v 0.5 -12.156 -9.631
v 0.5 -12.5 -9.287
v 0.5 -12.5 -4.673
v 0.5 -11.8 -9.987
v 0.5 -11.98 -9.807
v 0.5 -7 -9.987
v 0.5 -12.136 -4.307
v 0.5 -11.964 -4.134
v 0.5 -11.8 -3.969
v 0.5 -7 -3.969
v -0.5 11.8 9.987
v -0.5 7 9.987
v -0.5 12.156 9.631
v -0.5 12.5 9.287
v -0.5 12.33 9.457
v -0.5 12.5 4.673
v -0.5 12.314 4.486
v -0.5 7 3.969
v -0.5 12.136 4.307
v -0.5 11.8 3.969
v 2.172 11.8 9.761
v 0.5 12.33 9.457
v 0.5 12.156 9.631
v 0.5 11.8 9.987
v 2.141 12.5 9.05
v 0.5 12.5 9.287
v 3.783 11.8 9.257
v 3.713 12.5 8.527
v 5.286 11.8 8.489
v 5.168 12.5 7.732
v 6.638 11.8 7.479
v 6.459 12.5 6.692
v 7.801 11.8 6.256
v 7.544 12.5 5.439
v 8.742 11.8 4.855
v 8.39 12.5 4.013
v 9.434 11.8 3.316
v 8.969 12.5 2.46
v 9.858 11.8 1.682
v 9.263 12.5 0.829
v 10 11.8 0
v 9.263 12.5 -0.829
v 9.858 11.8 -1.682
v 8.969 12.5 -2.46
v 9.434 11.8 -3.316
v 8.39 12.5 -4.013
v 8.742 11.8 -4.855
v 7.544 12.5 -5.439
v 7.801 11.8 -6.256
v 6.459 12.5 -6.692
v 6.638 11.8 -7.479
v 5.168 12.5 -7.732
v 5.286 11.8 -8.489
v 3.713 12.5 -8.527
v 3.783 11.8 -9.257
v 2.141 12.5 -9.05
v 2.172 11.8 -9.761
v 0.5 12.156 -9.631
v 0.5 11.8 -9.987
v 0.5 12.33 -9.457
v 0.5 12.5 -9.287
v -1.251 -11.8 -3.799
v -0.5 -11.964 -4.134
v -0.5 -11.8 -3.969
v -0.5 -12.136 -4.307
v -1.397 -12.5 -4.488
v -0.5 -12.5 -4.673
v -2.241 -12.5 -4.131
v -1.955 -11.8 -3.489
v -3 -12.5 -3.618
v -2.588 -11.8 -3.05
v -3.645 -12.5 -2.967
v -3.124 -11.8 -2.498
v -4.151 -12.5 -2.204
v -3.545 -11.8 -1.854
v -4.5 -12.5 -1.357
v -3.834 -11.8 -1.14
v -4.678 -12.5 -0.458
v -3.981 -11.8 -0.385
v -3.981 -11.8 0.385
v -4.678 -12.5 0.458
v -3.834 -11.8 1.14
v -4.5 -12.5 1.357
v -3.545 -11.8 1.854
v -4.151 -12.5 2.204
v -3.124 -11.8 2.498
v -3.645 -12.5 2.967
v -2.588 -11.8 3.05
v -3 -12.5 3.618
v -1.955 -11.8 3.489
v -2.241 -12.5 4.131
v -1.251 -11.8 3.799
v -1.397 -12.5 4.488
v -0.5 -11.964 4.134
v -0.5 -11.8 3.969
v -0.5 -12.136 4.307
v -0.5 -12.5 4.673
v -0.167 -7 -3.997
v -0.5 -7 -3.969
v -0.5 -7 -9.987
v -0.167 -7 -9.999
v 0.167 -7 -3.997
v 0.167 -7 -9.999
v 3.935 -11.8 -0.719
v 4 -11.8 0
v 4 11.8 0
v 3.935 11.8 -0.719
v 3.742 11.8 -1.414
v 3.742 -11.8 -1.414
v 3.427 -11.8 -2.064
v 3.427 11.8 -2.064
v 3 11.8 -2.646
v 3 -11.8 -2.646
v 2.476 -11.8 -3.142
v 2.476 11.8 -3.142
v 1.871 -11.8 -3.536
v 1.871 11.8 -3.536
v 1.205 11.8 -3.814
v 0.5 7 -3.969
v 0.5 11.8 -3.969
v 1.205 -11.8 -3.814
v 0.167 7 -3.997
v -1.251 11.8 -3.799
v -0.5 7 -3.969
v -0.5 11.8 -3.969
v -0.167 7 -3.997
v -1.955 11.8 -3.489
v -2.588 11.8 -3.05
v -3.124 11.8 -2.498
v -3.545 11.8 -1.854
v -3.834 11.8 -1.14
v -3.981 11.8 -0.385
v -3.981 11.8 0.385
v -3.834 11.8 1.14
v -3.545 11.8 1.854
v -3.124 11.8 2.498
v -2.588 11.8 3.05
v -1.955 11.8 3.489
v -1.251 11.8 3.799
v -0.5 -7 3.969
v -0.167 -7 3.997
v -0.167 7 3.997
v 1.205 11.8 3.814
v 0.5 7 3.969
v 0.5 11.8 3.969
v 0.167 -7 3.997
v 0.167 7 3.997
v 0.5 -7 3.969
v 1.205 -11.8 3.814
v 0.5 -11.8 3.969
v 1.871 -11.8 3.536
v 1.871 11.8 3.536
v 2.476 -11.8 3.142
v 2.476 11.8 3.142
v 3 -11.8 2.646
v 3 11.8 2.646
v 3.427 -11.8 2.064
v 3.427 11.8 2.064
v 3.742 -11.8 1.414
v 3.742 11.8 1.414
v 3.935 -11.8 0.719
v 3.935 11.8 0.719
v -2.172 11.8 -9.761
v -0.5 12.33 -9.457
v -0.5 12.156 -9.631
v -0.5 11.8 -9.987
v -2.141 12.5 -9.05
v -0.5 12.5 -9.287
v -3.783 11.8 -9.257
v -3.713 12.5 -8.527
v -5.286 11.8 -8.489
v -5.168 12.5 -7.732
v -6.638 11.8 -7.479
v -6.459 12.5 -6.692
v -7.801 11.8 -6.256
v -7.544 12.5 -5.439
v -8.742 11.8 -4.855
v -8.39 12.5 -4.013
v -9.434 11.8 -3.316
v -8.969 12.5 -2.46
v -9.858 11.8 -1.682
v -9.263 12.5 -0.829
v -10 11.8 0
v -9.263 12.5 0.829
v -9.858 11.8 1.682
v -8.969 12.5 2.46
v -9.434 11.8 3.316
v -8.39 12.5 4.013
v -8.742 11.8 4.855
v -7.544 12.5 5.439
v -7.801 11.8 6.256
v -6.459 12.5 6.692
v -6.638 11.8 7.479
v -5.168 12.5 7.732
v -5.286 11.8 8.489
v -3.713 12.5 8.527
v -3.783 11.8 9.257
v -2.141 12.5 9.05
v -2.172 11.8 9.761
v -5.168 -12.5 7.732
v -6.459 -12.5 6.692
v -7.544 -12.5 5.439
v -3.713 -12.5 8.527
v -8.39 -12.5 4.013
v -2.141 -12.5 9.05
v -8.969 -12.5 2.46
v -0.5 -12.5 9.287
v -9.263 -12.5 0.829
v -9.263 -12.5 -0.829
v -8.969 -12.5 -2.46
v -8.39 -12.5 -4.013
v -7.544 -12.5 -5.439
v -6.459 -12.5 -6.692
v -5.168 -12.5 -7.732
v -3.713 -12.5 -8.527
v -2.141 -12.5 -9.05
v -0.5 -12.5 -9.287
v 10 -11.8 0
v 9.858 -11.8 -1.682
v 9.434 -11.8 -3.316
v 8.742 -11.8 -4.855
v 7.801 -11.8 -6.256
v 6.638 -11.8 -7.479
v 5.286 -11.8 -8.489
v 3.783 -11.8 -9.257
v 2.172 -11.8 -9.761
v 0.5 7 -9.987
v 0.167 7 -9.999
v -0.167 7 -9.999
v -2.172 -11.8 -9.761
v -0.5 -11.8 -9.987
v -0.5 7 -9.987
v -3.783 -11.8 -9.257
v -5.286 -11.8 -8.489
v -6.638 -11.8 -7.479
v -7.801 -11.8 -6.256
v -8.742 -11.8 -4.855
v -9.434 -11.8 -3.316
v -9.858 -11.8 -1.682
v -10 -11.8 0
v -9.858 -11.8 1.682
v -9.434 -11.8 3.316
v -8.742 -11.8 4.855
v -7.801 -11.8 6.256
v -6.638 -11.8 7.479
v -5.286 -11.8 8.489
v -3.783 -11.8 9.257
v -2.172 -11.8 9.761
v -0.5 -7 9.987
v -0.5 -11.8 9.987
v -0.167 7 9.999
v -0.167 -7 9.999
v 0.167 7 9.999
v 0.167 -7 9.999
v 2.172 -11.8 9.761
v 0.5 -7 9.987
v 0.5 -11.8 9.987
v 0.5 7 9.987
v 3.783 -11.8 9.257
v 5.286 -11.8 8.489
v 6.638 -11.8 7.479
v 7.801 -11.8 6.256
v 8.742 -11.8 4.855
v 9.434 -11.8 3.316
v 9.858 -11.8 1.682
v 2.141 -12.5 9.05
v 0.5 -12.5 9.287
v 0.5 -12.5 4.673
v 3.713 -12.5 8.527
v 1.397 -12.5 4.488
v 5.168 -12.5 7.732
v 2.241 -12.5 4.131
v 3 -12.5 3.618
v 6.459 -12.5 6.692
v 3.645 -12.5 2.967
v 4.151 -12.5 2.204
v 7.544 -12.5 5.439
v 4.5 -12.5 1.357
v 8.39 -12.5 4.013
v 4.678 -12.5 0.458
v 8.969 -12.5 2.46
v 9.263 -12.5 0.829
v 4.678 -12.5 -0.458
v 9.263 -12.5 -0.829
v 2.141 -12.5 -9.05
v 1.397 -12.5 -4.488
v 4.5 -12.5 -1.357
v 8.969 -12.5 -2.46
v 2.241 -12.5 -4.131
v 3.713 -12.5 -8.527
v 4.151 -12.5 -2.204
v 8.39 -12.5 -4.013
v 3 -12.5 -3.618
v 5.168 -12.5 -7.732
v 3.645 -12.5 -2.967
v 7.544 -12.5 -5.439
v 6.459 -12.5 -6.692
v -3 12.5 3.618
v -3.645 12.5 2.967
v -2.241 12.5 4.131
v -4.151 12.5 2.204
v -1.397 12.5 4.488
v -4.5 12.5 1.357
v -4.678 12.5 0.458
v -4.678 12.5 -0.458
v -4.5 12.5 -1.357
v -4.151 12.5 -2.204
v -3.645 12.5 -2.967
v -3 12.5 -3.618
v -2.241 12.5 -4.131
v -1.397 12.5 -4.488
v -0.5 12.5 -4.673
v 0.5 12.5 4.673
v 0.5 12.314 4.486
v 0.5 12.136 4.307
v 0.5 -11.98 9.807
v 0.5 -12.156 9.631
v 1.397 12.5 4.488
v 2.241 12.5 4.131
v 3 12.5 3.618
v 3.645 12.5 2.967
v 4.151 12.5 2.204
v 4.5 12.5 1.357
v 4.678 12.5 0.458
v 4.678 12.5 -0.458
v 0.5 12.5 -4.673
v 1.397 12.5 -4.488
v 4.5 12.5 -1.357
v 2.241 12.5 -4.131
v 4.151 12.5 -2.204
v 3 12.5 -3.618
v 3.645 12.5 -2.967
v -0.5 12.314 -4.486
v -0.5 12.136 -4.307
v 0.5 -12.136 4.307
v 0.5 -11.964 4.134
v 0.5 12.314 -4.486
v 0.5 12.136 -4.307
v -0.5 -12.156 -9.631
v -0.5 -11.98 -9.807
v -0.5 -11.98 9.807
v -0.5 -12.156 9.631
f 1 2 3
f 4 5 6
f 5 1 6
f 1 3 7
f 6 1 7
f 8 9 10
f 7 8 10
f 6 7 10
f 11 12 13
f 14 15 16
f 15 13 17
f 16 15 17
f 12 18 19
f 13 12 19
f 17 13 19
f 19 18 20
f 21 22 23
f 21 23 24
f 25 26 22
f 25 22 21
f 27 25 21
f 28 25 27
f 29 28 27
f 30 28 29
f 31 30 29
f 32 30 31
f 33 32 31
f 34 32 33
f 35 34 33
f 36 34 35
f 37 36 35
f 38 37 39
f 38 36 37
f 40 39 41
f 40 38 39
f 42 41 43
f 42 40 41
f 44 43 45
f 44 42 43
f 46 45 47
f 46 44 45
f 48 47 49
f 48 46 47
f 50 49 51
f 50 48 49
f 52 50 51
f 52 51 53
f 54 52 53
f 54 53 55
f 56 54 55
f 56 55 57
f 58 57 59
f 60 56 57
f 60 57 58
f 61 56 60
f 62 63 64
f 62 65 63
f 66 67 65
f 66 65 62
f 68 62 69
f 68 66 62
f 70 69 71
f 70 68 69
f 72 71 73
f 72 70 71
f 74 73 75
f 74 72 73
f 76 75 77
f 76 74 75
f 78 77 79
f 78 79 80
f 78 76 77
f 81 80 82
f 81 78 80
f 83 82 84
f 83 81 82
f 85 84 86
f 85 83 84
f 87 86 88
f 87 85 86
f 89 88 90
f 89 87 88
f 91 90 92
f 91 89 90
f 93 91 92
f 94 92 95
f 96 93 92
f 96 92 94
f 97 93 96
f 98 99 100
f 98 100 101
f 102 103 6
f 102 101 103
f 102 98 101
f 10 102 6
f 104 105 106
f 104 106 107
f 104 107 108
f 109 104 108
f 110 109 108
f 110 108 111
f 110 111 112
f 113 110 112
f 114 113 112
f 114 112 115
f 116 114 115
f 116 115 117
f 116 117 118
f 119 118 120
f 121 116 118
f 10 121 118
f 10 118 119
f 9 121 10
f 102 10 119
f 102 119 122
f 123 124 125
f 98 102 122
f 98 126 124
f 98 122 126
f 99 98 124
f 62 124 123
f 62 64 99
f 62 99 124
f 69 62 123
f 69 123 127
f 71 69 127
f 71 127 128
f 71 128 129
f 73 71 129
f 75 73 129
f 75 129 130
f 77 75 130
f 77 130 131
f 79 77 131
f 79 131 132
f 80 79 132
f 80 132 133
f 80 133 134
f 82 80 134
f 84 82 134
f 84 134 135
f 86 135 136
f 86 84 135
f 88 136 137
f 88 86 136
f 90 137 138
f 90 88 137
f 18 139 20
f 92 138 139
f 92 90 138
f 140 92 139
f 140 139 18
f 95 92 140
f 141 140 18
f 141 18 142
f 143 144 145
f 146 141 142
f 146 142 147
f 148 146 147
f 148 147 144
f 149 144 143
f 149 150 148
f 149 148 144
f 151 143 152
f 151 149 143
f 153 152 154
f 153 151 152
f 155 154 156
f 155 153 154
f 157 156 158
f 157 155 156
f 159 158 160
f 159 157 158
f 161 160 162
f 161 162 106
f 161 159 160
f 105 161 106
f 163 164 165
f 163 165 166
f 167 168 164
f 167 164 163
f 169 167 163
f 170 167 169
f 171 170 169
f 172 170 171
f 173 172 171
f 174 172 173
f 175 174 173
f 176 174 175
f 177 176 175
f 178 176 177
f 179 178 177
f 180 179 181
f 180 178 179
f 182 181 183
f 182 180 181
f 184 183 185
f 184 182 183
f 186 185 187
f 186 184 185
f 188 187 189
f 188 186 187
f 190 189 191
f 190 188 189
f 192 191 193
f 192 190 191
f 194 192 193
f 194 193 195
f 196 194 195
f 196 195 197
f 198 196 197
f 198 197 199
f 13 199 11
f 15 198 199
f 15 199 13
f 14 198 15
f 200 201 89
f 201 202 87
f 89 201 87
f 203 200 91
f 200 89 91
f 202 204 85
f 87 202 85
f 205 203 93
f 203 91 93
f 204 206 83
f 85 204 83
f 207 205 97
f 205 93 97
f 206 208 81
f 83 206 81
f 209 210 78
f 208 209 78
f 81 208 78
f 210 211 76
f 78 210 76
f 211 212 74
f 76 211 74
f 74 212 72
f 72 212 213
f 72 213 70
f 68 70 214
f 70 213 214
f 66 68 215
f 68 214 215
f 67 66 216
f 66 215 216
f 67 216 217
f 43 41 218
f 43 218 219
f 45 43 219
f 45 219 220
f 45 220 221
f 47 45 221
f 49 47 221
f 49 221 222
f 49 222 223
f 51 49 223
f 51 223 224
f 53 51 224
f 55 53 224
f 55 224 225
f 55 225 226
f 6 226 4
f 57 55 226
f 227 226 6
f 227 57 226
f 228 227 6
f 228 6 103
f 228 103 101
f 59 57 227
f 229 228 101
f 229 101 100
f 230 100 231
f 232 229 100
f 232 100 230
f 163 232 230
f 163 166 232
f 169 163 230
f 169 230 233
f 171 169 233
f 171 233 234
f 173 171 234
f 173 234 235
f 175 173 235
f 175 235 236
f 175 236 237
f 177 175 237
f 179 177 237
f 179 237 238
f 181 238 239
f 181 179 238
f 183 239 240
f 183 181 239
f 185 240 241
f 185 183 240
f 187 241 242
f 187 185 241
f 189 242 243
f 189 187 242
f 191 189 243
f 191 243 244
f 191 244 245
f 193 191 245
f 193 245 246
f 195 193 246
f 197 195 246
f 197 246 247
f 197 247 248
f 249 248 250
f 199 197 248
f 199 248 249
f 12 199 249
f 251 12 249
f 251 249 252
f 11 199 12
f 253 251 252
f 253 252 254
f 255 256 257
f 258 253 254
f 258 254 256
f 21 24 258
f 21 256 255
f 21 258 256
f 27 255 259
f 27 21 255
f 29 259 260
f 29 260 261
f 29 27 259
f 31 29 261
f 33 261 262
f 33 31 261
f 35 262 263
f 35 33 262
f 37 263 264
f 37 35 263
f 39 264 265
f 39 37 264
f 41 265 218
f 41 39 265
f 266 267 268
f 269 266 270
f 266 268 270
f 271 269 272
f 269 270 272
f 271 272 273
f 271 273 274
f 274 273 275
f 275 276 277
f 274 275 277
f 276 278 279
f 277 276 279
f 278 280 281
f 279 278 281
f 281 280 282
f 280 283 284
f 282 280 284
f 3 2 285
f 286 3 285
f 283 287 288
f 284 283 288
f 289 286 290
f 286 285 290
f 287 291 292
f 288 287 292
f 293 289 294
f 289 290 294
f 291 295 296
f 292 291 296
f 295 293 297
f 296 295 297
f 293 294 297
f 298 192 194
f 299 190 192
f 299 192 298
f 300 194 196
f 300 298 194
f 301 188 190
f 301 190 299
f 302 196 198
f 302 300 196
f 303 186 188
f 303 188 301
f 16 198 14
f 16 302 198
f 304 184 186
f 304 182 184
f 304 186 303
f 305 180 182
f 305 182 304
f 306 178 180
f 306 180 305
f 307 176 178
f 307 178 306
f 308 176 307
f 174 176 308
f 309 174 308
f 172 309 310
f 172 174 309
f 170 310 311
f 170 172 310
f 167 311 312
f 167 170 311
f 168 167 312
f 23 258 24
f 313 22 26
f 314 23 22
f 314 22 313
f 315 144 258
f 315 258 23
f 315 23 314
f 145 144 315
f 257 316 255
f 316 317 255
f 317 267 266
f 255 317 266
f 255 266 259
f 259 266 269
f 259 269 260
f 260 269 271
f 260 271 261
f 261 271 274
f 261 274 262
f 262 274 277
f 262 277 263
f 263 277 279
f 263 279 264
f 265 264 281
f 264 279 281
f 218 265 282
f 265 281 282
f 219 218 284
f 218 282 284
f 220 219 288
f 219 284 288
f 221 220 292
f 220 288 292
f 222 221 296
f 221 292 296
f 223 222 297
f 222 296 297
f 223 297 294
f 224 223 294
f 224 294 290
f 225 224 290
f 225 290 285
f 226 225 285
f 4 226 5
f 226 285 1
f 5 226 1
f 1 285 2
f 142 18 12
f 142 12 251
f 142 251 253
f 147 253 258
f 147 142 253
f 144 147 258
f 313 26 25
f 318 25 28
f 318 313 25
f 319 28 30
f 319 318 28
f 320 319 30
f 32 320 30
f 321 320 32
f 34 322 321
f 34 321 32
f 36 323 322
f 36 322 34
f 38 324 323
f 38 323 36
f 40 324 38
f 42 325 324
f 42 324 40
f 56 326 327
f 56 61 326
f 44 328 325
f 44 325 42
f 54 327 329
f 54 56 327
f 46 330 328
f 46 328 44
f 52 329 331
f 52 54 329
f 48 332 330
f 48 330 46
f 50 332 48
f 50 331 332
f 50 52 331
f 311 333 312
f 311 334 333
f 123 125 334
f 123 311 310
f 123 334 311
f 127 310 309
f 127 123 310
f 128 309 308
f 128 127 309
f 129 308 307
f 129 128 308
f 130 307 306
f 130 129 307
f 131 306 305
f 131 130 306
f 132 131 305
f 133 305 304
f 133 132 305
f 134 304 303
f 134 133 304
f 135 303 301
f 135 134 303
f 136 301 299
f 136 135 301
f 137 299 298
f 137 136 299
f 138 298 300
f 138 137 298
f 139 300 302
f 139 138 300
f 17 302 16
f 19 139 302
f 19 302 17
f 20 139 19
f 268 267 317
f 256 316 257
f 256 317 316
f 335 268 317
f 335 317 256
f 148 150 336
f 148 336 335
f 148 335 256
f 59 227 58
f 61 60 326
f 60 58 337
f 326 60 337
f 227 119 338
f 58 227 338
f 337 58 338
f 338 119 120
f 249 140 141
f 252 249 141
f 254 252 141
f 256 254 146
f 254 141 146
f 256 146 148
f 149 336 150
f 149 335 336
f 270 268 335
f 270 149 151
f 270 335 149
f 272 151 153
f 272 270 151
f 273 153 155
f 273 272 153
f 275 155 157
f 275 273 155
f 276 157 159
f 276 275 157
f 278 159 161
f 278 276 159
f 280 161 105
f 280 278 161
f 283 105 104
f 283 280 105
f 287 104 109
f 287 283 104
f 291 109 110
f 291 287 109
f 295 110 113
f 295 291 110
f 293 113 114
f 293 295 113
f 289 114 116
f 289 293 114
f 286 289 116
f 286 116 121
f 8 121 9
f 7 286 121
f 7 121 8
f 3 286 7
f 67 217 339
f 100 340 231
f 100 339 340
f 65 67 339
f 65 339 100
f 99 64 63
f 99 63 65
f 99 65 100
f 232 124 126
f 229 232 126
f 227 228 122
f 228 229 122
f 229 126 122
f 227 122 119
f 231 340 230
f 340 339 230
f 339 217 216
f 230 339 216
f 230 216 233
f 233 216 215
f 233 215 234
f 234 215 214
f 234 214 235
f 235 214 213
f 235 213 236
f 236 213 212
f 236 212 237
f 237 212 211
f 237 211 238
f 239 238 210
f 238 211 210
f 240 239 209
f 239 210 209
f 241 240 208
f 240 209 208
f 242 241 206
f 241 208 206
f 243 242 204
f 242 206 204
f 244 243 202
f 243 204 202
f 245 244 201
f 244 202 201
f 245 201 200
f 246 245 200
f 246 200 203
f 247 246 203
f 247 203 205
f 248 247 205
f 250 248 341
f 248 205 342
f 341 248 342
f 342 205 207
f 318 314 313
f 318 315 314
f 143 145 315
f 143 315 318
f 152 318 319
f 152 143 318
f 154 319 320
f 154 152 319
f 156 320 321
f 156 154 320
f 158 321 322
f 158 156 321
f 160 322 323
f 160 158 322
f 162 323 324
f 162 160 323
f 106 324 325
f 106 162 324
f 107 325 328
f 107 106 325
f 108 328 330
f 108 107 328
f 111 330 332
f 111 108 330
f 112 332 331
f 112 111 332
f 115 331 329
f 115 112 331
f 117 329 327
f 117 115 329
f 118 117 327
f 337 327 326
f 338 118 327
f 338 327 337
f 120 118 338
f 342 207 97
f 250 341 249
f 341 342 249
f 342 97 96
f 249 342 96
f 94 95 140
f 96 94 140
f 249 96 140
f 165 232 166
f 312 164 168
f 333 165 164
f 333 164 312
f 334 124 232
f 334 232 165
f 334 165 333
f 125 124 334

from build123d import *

# Parameters (mm, degrees)
SKETCH1_R               = 10
SKETCH1_R_2             = 4
BOSS_EXTRUDE1_DEPTH     = 12.5
CHAMFER1_SIZE           = 0.7
SKETCH2_W               = 1
SKETCH2_H               = 20.36289329
CUT_EXTRUDE1_DEPTH      = 40
CUT_EXTRUDE1_DEPTH_BACK = 36


with BuildPart() as part:
    # Sketch1 → Boss-Extrude1 (new body, symmetric)
    with BuildSketch(Plane(origin=(0, 0, 0), x_dir=(1, 0, 0), z_dir=(0, 1, 0))):
        Circle(SKETCH1_R)
        Circle(SKETCH1_R_2, mode=Mode.SUBTRACT)
    extrude(amount=BOSS_EXTRUDE1_DEPTH, both=True)

    # Chamfer1
    chamfer1_edges = [part.edges().sort_by_distance(p)[0] for p in [
        (-10, -12.5, 0),
        (-10, 12.5, 0),
        (-4, -12.5, 0),
        (-4, 12.5, 0),
    ]]
    chamfer(chamfer1_edges, length=CHAMFER1_SIZE)

    # Sketch2 → Cut-Extrude1 (cut, two sides)
    with BuildSketch(Plane.XY) as cut_extrude1_sk:
        with Locations((0, 17.181446645)):
            Rectangle(SKETCH2_W, SKETCH2_H)
        with Locations((0, -17.181446645)):
            Rectangle(SKETCH2_W, SKETCH2_H)
    extrude(amount=CUT_EXTRUDE1_DEPTH, mode=Mode.SUBTRACT)
    extrude(cut_extrude1_sk.sketch, amount=-CUT_EXTRUDE1_DEPTH_BACK, mode=Mode.SUBTRACT)


solid = part.part
